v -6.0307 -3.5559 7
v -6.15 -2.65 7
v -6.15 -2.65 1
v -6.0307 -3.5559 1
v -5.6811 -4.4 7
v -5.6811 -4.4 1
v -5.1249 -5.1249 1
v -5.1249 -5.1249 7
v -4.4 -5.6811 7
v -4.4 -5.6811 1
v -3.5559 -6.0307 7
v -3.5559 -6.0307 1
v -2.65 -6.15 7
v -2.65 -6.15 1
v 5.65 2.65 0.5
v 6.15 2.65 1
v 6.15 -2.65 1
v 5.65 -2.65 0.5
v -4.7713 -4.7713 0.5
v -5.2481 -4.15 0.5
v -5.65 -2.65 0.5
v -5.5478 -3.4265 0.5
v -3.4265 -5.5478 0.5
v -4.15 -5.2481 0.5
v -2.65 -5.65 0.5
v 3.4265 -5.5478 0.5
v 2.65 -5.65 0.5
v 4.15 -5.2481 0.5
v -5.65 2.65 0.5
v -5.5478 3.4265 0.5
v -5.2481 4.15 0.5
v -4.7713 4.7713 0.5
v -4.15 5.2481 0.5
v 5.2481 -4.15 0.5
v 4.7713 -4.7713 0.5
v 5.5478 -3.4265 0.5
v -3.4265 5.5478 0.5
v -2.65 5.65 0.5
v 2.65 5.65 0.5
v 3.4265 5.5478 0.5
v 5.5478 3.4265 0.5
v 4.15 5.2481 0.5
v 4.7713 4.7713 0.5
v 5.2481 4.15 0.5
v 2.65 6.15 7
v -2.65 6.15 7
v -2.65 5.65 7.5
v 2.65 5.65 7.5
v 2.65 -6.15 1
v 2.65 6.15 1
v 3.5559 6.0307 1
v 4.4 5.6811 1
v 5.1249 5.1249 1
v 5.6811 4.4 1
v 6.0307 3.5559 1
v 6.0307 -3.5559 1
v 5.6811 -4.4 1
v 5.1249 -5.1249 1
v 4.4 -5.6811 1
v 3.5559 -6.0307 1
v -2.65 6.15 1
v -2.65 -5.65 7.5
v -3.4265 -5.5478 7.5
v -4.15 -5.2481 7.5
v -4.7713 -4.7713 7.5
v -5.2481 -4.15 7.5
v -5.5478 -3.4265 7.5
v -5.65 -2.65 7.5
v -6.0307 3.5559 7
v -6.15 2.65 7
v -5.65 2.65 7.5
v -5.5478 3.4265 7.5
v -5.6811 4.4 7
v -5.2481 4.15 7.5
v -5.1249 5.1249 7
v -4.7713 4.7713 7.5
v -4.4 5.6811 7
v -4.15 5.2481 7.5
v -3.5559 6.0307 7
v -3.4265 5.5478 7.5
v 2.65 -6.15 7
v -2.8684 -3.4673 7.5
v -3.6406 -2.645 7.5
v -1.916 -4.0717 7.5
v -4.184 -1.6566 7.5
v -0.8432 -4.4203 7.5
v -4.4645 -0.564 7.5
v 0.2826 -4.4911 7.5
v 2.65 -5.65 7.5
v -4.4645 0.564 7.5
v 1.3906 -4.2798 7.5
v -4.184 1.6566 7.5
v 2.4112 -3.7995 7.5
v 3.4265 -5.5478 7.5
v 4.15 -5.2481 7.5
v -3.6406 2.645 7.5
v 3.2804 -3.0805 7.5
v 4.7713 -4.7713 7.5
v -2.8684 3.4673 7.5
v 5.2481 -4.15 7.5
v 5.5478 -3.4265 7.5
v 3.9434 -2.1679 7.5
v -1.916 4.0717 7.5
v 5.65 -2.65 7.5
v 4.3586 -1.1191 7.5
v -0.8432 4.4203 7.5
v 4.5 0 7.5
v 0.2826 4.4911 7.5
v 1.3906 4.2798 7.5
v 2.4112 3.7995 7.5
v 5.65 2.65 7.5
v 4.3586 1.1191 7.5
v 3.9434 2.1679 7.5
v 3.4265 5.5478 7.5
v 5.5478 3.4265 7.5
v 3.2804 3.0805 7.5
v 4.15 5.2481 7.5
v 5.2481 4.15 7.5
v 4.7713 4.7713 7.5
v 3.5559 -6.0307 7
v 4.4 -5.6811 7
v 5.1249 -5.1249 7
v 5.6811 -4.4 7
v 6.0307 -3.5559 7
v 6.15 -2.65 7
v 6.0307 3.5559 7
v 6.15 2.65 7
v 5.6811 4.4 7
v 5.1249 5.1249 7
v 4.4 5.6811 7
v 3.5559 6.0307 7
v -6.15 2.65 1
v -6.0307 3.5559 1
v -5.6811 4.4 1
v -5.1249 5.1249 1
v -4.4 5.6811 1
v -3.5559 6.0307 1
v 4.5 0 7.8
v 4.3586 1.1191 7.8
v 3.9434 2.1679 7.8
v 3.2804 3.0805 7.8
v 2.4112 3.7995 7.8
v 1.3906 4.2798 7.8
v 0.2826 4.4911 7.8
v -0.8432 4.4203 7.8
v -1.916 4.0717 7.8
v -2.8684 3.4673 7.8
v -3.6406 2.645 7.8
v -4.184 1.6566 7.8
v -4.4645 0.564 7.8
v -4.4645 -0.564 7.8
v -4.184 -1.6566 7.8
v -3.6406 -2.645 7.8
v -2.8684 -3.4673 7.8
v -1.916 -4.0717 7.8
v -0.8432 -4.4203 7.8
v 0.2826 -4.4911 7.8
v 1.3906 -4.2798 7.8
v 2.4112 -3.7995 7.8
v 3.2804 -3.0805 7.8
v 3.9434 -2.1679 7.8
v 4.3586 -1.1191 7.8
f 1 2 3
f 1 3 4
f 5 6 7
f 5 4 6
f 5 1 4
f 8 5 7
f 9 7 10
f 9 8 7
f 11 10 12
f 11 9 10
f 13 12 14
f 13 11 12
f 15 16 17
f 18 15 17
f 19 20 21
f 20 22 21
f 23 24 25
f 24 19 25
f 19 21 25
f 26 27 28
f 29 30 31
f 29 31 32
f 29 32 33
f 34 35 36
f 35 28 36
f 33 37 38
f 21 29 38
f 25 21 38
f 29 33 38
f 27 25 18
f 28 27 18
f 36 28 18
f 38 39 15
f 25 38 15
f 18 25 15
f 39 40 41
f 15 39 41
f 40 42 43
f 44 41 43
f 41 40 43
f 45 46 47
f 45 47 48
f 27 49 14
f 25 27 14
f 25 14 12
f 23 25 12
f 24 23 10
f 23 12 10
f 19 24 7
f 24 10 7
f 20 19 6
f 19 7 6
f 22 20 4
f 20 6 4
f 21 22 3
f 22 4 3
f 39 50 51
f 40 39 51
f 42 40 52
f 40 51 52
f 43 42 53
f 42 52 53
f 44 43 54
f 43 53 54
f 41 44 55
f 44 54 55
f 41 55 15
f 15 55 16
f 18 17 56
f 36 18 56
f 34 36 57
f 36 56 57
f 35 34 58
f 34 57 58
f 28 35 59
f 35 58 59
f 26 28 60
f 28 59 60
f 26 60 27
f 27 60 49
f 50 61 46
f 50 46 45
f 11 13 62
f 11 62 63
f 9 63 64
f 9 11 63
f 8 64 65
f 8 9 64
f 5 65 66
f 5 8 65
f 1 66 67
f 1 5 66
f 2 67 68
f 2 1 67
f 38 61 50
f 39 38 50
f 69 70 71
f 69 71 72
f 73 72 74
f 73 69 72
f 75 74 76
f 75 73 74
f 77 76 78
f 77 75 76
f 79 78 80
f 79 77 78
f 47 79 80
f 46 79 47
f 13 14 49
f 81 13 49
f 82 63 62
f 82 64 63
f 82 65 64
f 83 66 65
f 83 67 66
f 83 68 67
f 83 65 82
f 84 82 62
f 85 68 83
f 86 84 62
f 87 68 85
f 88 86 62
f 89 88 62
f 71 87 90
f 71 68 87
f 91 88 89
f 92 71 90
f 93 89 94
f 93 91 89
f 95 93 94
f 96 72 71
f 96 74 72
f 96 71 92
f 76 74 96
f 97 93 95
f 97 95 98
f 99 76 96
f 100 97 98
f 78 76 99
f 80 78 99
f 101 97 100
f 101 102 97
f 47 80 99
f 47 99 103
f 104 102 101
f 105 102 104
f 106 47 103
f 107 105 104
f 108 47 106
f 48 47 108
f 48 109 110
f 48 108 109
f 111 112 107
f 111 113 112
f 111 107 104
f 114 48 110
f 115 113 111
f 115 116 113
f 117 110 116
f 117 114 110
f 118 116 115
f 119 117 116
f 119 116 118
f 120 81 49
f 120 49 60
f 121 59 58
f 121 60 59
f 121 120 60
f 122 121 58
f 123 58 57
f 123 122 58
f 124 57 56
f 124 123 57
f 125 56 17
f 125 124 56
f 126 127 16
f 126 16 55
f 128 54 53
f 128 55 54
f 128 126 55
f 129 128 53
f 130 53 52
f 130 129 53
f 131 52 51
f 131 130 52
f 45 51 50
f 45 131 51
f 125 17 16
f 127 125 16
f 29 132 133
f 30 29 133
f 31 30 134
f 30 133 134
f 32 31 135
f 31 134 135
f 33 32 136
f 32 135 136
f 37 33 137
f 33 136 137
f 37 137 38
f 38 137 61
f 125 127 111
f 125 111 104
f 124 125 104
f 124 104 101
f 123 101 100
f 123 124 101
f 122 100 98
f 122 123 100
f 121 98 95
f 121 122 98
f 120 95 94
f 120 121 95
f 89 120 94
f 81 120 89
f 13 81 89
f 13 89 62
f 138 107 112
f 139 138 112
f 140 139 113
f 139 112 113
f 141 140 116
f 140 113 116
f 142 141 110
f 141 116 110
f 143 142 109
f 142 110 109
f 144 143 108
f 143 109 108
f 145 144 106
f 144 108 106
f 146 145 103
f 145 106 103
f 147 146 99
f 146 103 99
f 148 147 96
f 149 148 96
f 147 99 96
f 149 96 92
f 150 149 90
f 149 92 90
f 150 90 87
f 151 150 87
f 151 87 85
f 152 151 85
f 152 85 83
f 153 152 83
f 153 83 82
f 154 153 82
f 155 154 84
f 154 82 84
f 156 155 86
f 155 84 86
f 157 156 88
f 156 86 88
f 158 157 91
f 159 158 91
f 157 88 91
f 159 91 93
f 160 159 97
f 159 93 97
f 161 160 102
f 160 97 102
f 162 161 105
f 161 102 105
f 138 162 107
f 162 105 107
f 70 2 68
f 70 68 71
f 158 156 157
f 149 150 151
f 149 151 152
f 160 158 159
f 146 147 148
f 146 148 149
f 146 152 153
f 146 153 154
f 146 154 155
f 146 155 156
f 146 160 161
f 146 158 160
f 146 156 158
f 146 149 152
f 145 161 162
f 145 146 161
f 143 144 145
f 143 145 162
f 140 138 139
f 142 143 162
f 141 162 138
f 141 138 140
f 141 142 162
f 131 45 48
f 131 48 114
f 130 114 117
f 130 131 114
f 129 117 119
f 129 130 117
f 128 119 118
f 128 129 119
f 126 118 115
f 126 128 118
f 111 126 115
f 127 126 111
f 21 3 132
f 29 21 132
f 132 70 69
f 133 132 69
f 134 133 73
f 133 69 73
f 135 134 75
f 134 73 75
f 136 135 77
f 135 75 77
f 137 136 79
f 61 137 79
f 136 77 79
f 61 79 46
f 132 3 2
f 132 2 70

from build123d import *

# Parameters (mm, degrees)
SKETCH_W     = 12.3
SKETCH_H     = 12.3
PAD_DEPTH    = 7
FILLET_R     = 3.5
CHAMFER_SIZE = 0.5
SKETCH002_R  = 4.5
PAD002_DEPTH = 0.3


with BuildPart() as part:
    # Sketch → Pad (new body)
    with BuildSketch(Plane.XY.offset(0.5)):
        Rectangle(SKETCH_W, SKETCH_H)
    extrude(amount=PAD_DEPTH)

    # Fillet
    fillet_edges = [part.edges().sort_by_distance(p)[0] for p in [
        (6.15, 6.15, 4),
        (6.15, -6.15, 4),
        (-6.15, 6.15, 4),
        (-6.15, -6.15, 4),
    ]]
    fillet(fillet_edges, radius=FILLET_R)

    # Chamfer
    chamfer_edges = [part.edges().sort_by_distance(p)[0] for p in [
        (0, 6.15, 7.5),
        (-5.124874, 5.124874, 7.5),
        (5.124874, 5.124874, 7.5),
        (-6.15, 0, 7.5),
        (6.15, 0, 7.5),
        (-5.124874, -5.124874, 7.5),
        (5.124874, -5.124874, 7.5),
        (0, -6.15, 7.5),
        (0, 6.15, 0.5),
        (-5.124874, 5.124874, 0.5),
        (5.124874, 5.124874, 0.5),
        (-6.15, 0, 0.5),
        (6.15, 0, 0.5),
        (-5.124874, -5.124874, 0.5),
        (5.124874, -5.124874, 0.5),
        (0, -6.15, 0.5),
    ]]
    chamfer(chamfer_edges, length=CHAMFER_SIZE)

    # Sketch002 (on Face11 of Chamfer) → Pad002 (join)
    with BuildSketch(Plane.XY.offset(7.5)):
        Circle(SKETCH002_R)
    extrude(amount=PAD002_DEPTH)


solid = part.part
